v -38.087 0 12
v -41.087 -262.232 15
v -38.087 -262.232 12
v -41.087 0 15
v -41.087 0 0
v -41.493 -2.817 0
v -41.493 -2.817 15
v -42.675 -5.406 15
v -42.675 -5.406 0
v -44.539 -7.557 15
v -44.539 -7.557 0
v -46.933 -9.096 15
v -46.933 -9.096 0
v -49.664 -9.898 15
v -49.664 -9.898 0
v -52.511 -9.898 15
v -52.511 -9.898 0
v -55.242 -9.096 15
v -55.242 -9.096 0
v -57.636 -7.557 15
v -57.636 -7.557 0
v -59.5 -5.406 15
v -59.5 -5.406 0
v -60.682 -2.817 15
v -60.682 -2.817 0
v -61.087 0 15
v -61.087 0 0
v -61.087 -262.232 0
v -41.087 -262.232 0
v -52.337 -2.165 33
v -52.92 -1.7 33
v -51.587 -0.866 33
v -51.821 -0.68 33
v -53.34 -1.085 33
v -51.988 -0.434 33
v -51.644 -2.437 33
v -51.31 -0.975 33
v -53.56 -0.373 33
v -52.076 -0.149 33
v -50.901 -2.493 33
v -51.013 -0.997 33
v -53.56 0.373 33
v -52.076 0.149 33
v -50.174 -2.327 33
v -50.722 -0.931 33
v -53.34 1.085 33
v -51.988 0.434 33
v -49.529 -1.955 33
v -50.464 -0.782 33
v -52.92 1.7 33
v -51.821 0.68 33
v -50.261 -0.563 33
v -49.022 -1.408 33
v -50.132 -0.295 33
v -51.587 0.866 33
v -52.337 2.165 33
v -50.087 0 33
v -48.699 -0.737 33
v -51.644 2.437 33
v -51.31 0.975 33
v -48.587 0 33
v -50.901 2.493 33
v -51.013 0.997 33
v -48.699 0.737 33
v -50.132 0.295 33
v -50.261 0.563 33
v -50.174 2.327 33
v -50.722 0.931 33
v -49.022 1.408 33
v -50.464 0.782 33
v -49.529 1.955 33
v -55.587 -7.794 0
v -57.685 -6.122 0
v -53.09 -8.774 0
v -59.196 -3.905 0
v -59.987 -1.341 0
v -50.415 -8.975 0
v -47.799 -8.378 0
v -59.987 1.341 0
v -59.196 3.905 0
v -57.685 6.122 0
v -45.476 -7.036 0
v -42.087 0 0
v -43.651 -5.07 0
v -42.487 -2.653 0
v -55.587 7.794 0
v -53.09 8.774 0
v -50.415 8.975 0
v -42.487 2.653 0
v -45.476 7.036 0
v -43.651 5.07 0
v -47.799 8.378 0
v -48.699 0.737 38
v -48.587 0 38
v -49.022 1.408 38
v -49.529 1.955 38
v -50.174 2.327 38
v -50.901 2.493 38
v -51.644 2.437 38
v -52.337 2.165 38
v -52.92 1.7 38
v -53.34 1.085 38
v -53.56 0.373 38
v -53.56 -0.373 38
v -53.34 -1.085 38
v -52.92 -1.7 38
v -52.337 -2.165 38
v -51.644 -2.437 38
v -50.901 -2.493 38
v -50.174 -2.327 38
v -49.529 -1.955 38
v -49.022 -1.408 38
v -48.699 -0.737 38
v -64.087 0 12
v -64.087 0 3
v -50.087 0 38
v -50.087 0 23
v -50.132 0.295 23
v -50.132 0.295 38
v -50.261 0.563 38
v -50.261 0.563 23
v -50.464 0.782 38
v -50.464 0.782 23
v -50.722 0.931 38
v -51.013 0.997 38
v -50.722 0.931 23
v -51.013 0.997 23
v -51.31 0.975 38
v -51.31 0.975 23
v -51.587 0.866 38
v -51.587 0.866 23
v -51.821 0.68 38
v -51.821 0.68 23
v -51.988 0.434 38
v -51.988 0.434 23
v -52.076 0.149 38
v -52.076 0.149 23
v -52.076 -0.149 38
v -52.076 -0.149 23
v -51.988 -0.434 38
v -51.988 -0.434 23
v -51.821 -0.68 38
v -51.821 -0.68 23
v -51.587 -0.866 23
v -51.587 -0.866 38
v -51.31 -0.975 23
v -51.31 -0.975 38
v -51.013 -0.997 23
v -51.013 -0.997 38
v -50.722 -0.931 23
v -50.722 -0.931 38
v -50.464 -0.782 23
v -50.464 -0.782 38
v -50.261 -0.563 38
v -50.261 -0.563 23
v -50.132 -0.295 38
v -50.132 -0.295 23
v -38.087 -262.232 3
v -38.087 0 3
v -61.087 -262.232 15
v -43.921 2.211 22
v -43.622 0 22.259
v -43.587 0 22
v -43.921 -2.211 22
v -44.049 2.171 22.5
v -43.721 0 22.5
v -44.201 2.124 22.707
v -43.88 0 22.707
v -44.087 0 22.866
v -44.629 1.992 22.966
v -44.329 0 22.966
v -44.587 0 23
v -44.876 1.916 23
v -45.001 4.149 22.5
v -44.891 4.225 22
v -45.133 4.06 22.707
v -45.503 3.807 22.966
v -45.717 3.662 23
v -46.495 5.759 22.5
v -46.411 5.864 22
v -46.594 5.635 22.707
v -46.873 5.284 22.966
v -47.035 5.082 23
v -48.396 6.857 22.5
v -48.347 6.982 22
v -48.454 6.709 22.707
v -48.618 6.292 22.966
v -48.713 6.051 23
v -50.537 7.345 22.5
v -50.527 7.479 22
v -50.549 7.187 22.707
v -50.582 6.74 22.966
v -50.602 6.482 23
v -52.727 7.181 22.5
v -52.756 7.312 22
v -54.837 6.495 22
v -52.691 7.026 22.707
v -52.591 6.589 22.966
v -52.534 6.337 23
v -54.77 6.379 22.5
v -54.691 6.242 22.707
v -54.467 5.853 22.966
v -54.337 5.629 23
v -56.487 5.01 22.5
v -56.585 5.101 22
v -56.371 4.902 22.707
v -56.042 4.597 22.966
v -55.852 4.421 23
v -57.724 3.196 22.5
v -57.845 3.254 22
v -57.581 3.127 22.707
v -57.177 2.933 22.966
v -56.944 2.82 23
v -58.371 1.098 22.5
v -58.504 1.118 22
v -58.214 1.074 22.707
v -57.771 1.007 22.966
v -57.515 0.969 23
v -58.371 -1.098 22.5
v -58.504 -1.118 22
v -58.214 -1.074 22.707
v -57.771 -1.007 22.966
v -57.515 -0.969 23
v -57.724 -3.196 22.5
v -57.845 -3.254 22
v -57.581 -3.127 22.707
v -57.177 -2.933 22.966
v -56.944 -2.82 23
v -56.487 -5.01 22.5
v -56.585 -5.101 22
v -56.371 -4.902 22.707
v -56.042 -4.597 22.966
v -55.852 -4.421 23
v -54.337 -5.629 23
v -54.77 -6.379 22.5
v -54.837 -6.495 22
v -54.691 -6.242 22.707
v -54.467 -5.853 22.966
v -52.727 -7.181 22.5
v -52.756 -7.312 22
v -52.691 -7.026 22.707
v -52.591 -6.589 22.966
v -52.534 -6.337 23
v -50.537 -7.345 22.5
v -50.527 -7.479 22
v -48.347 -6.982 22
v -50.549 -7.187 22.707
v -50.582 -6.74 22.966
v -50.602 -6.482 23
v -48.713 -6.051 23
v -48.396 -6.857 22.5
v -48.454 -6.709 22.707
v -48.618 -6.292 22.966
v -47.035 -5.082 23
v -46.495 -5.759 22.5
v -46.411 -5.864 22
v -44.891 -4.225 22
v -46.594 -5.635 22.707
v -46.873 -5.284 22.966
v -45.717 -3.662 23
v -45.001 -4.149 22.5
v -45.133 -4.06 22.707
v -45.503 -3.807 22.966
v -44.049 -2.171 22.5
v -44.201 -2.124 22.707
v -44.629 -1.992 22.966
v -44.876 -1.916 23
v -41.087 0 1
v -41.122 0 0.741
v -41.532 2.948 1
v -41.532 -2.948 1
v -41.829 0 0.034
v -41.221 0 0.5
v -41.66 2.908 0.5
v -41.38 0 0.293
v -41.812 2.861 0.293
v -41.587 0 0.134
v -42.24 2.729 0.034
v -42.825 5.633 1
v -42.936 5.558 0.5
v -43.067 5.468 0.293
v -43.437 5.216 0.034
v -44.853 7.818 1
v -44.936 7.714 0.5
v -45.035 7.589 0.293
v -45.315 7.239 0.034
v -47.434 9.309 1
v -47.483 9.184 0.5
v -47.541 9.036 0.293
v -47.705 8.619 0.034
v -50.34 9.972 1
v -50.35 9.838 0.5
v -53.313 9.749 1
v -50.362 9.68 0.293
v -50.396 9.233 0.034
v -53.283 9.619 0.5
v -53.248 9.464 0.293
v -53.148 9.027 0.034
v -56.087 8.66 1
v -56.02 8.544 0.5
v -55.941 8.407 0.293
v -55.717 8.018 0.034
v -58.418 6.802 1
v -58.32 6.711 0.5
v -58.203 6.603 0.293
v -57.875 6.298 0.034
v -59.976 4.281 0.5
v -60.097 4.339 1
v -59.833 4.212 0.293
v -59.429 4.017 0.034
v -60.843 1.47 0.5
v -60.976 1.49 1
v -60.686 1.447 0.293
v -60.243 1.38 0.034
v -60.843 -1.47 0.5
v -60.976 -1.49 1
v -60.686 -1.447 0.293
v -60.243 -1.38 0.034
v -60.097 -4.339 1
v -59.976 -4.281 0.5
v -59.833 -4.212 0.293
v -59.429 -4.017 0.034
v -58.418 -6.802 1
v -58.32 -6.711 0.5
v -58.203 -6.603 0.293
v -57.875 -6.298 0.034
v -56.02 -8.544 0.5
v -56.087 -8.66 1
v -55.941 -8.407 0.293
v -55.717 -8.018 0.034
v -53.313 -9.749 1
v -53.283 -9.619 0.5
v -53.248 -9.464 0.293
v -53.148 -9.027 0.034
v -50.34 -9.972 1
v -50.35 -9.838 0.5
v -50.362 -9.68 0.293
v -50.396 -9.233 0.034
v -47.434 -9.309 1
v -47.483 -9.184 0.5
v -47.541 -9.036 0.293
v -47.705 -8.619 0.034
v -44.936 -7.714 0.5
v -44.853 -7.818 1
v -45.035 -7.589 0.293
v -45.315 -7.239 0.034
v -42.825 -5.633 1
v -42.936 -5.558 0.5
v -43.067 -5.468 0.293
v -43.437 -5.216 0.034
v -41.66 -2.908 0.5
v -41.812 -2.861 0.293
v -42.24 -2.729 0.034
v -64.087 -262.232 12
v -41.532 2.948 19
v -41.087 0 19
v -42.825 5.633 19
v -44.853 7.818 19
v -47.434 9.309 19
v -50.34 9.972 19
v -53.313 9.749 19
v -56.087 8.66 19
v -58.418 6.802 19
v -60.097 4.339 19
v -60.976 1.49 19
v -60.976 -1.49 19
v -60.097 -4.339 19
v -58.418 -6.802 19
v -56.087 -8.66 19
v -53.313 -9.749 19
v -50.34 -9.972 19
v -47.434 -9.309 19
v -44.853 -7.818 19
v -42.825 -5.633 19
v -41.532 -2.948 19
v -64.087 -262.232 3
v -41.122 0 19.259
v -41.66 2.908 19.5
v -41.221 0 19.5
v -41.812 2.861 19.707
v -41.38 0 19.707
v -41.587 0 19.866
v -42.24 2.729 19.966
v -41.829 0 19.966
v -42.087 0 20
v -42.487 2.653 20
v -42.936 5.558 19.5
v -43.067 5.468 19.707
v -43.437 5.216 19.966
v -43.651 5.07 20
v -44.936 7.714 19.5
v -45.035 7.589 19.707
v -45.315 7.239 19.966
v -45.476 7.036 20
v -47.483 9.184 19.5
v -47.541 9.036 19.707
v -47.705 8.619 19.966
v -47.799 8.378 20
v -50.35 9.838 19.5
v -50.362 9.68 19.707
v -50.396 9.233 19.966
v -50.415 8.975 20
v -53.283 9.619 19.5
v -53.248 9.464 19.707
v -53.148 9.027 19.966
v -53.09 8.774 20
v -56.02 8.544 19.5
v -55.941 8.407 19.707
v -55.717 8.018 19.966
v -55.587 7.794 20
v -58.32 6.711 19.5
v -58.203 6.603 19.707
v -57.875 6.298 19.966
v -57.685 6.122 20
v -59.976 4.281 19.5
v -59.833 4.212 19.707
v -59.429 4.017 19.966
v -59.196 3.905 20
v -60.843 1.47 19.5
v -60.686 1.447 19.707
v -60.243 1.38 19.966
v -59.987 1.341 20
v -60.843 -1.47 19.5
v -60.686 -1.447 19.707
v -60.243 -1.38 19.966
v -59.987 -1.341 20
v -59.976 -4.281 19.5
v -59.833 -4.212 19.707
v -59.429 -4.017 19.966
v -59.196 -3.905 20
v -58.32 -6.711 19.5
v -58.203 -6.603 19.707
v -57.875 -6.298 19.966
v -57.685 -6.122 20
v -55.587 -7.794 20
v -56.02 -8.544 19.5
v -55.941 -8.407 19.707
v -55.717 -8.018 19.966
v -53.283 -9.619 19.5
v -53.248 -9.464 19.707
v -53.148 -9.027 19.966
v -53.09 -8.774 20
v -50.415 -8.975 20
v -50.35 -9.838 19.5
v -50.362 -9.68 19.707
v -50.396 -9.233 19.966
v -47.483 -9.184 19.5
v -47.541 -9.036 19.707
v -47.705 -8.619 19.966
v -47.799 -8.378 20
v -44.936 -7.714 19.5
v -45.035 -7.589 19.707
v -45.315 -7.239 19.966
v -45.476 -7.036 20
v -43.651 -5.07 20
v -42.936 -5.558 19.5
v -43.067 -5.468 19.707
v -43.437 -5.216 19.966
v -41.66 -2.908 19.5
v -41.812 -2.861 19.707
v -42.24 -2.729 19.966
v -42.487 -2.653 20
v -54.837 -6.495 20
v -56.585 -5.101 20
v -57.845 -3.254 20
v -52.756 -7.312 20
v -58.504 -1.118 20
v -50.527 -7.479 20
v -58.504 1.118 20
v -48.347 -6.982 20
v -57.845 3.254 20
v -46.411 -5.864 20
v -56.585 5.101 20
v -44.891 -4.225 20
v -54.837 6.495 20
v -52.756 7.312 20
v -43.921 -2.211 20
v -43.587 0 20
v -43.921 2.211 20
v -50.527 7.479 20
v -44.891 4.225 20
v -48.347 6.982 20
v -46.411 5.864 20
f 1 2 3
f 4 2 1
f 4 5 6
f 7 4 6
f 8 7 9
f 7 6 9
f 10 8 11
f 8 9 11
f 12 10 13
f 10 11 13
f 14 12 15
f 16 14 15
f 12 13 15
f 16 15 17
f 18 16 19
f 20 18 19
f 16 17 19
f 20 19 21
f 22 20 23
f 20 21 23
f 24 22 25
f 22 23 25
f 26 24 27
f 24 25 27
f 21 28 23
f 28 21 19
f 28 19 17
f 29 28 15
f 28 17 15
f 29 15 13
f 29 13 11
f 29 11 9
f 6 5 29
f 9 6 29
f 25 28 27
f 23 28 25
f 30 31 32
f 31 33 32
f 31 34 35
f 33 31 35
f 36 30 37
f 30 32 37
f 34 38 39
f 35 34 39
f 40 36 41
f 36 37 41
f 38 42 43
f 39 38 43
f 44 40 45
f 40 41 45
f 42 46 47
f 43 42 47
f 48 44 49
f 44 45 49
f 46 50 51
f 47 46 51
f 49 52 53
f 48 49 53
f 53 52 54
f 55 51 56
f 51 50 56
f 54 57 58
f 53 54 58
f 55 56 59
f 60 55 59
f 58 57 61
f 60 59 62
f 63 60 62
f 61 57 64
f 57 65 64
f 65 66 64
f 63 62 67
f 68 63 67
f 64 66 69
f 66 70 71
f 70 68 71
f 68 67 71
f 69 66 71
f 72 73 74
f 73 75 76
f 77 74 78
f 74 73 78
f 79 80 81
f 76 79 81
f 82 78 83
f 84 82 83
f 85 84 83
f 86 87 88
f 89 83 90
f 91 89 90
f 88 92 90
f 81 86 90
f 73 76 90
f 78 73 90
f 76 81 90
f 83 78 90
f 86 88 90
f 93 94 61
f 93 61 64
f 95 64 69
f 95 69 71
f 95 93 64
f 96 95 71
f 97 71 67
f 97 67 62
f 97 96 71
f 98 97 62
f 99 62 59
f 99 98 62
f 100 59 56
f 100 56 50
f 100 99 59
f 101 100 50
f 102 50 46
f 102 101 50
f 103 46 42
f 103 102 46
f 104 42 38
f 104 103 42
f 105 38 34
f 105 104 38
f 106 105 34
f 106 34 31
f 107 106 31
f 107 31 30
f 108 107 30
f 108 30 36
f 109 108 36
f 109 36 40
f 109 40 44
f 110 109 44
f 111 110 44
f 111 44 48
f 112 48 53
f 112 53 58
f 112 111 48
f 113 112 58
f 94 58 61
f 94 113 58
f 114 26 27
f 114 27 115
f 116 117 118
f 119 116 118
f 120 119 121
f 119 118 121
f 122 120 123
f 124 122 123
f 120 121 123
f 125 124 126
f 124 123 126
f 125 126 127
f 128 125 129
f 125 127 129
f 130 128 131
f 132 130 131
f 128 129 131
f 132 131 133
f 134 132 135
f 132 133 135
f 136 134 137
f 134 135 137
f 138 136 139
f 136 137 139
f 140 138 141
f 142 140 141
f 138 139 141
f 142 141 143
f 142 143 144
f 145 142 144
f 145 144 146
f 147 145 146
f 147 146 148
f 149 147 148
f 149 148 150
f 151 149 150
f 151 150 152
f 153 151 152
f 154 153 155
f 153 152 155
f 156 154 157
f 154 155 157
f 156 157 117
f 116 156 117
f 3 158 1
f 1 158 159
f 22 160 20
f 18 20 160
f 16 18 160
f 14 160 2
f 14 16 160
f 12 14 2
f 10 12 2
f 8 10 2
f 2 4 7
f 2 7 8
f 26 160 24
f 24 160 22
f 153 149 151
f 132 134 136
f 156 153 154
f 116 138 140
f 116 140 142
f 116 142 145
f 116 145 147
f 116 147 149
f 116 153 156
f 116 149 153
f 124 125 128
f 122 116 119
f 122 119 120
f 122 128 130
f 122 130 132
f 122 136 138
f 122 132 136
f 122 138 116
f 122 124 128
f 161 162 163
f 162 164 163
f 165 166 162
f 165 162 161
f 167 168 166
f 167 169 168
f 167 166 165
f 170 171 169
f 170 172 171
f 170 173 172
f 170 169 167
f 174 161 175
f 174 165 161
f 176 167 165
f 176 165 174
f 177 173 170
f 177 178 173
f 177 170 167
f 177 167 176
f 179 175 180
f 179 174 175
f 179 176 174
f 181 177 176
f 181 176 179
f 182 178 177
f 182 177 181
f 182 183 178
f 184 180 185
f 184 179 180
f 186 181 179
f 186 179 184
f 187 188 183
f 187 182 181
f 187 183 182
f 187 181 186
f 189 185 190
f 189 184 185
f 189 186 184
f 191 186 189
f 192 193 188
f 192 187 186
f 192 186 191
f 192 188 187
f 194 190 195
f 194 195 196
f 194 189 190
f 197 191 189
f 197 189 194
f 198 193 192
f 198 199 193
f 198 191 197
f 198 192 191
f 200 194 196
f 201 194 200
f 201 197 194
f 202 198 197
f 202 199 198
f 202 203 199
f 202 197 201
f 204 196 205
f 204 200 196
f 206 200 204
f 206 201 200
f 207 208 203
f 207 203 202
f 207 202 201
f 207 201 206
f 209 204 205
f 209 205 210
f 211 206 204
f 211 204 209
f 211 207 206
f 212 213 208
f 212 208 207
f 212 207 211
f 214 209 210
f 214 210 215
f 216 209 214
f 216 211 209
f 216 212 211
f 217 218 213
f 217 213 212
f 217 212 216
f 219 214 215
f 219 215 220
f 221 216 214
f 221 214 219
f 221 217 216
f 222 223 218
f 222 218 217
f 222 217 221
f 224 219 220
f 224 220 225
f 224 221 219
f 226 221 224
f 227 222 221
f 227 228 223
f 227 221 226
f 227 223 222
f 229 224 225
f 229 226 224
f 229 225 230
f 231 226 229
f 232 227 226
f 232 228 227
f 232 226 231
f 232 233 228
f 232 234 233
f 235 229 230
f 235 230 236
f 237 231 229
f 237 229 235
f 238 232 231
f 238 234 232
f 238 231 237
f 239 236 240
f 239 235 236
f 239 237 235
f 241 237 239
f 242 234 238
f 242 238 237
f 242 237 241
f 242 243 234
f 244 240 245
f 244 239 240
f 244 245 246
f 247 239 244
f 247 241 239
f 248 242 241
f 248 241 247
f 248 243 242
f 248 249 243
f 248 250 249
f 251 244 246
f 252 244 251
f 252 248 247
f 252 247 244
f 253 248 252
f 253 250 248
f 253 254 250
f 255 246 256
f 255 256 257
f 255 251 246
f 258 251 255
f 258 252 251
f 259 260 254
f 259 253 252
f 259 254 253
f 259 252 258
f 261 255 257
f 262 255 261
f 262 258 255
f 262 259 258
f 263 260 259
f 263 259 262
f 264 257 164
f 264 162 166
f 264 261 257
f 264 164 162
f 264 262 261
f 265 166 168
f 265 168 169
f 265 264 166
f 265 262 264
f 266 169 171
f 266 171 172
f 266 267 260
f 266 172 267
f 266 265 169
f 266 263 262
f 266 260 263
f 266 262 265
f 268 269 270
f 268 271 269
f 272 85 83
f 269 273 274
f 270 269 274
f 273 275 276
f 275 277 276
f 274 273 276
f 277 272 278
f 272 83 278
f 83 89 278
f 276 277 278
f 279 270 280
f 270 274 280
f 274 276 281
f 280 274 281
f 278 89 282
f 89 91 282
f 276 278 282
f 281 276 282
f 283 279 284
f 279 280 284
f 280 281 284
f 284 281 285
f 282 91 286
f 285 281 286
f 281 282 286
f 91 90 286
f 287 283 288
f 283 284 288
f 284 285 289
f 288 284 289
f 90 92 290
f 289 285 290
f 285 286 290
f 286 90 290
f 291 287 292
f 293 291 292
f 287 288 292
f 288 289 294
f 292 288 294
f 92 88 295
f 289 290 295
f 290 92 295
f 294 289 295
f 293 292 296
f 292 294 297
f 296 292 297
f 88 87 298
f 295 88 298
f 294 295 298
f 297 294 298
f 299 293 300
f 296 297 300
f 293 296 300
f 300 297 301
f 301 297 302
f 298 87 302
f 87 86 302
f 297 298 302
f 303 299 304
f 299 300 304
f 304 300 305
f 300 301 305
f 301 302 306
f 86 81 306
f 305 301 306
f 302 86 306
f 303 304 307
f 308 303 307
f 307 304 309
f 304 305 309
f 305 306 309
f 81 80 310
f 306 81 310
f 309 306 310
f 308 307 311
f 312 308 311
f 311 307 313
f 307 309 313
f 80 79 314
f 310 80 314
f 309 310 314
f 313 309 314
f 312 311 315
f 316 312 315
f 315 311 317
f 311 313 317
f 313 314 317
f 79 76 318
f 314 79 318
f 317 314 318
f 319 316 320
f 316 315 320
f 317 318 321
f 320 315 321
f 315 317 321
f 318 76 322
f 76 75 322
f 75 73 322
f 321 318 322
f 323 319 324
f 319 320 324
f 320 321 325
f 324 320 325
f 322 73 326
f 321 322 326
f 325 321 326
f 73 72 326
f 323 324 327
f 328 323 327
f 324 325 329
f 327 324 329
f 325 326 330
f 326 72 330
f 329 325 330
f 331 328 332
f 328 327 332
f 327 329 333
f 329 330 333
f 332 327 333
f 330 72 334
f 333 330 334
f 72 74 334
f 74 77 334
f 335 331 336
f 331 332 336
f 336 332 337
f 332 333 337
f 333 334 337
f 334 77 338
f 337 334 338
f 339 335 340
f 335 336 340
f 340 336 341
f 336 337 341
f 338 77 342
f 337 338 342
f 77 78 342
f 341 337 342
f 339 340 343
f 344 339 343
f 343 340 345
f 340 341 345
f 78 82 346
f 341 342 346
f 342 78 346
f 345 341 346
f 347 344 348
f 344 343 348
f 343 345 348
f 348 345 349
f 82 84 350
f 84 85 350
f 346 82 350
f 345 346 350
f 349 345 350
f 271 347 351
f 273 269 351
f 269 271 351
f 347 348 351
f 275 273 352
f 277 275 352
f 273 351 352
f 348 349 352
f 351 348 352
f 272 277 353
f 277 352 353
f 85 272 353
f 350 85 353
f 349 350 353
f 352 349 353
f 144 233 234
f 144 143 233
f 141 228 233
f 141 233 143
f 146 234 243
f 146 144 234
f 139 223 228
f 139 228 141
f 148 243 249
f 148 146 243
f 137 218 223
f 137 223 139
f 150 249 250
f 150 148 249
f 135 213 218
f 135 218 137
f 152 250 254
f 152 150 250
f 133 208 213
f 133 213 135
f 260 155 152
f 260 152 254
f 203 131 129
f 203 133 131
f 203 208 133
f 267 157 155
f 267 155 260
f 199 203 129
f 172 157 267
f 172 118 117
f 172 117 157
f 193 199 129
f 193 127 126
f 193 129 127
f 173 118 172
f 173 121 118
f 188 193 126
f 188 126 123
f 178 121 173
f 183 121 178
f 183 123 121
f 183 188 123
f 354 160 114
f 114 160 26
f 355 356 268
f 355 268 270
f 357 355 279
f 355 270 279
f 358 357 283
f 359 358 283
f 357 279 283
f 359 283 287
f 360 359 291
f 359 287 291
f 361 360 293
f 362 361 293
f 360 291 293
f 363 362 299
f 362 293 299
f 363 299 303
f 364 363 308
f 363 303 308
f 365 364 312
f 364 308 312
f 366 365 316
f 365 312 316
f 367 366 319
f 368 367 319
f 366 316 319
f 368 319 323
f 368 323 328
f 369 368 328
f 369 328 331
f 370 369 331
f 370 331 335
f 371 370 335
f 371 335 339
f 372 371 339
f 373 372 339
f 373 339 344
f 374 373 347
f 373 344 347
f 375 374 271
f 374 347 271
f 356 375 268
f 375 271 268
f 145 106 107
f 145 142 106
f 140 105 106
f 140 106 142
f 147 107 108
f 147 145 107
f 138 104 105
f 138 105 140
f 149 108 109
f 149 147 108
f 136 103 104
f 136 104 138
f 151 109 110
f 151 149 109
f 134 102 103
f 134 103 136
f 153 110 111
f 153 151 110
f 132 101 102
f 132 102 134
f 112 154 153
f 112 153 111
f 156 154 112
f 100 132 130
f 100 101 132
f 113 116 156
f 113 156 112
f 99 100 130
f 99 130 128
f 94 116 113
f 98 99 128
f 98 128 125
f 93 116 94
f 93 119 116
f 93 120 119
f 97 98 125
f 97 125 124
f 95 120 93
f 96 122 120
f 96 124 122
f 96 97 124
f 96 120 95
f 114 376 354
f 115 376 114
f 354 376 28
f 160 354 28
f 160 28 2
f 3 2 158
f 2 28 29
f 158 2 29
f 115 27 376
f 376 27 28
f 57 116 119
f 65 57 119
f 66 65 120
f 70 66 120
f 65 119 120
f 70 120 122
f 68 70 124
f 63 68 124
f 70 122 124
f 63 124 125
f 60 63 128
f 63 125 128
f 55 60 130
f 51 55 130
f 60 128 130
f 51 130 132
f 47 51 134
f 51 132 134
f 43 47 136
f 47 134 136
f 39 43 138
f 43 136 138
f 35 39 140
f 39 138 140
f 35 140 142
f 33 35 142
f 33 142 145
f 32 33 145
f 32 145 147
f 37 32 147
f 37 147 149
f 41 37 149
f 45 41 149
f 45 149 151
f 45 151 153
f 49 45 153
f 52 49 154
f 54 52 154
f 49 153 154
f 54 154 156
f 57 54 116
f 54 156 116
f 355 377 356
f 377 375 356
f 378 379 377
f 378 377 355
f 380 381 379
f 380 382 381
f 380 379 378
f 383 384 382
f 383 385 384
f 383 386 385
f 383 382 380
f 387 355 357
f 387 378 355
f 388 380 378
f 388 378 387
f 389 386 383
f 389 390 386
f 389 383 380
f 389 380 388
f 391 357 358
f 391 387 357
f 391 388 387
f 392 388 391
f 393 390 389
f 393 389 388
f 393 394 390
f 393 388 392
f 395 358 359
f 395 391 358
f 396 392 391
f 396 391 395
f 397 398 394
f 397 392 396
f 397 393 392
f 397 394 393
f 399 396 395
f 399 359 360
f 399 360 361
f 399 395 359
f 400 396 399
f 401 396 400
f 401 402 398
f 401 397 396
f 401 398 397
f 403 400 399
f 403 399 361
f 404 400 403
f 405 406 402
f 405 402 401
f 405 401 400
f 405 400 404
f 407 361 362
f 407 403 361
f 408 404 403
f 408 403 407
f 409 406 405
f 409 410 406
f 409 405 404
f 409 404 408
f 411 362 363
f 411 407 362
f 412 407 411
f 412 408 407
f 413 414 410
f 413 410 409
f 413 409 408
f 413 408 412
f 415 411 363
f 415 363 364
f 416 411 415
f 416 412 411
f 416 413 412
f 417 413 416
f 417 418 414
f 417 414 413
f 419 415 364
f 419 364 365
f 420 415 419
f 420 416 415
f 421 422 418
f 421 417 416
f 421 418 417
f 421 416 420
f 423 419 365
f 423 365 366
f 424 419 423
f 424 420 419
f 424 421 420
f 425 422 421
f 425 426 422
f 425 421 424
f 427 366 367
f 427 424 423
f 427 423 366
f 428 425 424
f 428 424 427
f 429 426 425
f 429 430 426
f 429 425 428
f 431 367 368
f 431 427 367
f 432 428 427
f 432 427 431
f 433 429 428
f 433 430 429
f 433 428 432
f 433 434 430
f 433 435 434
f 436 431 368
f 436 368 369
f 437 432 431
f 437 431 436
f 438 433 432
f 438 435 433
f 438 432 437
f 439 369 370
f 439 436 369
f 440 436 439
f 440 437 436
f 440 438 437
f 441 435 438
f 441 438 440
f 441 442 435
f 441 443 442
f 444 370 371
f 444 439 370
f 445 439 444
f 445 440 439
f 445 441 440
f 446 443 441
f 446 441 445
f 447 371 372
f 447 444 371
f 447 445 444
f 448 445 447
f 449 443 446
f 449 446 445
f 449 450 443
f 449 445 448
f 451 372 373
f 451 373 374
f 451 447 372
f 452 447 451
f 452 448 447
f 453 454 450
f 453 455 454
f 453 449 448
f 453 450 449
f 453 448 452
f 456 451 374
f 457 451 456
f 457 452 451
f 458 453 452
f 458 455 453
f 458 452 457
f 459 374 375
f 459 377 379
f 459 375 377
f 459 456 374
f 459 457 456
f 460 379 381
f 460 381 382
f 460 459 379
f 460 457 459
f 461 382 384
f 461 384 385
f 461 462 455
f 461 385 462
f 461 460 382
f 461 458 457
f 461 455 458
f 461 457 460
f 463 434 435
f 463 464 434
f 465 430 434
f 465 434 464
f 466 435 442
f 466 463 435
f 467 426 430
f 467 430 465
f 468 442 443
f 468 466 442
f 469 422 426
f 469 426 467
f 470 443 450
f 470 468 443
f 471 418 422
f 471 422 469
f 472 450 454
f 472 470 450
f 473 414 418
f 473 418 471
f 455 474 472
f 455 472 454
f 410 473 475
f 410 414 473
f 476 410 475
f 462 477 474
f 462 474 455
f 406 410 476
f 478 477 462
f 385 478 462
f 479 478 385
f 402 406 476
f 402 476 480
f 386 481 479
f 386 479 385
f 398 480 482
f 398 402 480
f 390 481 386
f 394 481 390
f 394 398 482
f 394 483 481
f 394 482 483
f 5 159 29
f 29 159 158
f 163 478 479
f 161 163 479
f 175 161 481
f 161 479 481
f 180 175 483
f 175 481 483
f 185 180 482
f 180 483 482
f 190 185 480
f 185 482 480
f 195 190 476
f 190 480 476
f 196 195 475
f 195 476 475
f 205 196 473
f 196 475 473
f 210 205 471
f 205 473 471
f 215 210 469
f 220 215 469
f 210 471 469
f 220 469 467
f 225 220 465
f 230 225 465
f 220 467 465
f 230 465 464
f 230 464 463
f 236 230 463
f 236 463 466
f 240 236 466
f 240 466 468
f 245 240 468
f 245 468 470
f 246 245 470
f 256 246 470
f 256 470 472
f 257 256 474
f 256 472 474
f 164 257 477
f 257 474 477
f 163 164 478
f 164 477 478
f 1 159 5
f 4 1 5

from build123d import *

# Parameters (mm, degrees)
F0_R      = 10
F1_DEPTH  = 20
F2_R      = 7.5
F3_DEPTH  = 3
F4_R      = 1
F5_DEPTH  = 15
F6_R      = 2.5
F6_R_2    = 1
F7_DEPTH  = 5
F8_R      = 1
F10_DEPTH = 15
F9_W      = 26
F9_H      = 250
F11_DEPTH = 15
F12_SIZE  = 3


with BuildPart() as f1:
    # F0 (on Top) → F1 (new body)
    with BuildSketch(Plane.XY):
        with Locations((-51.0874686381, 0)):
            Circle(F0_R)
    extrude(amount=F1_DEPTH)

    # F2 (on face) → F3 (join)
    with BuildSketch(Plane.XY.offset(20)):
        with Locations((-51.0874686381, 0)):
            Circle(F2_R)
    extrude(amount=F3_DEPTH)

    # F4 (on face) → F5 (join)
    with BuildSketch(Plane.XY.offset(23)):
        with Locations((-51.0874686381, 0)):
            Circle(F4_R)
    extrude(amount=F5_DEPTH)

    # F8
    f8_edges = [f1.edges().sort_by_distance(p)[0] for p in [
        (-61.087469, 0, 0),
        (-61.087469, 0, 20),
        (-58.587469, 0, 23),
    ]]
    fillet(f8_edges, radius=F8_R)


with BuildPart() as f7:
    # F6 (on face) → F7 (new body)
    with BuildSketch(Plane.XY.offset(38)):
        with Locations((-51.0874686381, 0)):
            Circle(F6_R)
        with Locations((-51.0874686381, 0)):
            Circle(F6_R_2, mode=Mode.SUBTRACT)
    extrude(amount=-F7_DEPTH)


with BuildPart() as f10:
    # F9 (on Top) → F10 (new body)
    with BuildSketch(Plane.XY):
        with BuildLine():
            Line((-38.0874686381, 0), (-41.0874686381, 0))
            ThreePointArc((-41.0874686381, 0), (-51.0874686381, -10), (-61.0874686381, 0))
            Line((-61.0874686381, 0), (-64.0874686381, 0))
            Line((-64.0874686381, 0), (-64.0874686381, -12.2324628755))
            Line((-64.0874686381, -12.2324628755), (-38.0874686381, -12.2324628755))
            Line((-38.0874686381, -12.2324628755), (-38.0874686381, 0))
        make_face()
    extrude(amount=F10_DEPTH)

    # F9 (on Top) → F11 (join)
    with BuildSketch(Plane.XY):
        with Locations((-51.0874686381, -137.2324628755)):
            Rectangle(F9_W, F9_H)
    extrude(amount=F11_DEPTH)

    # F12
    f12_edges = [f10.edges().sort_by_distance(p)[0] for p in [
        (-64.087469, -131.116231, 15),
        (-38.087469, -131.116231, 15),
        (-38.087469, -131.116231, 0),
        (-64.087469, -131.116231, 0),
    ]]
    chamfer(f12_edges, length=F12_SIZE)


solid = Compound([f1.part, f7.part, f10.part])
